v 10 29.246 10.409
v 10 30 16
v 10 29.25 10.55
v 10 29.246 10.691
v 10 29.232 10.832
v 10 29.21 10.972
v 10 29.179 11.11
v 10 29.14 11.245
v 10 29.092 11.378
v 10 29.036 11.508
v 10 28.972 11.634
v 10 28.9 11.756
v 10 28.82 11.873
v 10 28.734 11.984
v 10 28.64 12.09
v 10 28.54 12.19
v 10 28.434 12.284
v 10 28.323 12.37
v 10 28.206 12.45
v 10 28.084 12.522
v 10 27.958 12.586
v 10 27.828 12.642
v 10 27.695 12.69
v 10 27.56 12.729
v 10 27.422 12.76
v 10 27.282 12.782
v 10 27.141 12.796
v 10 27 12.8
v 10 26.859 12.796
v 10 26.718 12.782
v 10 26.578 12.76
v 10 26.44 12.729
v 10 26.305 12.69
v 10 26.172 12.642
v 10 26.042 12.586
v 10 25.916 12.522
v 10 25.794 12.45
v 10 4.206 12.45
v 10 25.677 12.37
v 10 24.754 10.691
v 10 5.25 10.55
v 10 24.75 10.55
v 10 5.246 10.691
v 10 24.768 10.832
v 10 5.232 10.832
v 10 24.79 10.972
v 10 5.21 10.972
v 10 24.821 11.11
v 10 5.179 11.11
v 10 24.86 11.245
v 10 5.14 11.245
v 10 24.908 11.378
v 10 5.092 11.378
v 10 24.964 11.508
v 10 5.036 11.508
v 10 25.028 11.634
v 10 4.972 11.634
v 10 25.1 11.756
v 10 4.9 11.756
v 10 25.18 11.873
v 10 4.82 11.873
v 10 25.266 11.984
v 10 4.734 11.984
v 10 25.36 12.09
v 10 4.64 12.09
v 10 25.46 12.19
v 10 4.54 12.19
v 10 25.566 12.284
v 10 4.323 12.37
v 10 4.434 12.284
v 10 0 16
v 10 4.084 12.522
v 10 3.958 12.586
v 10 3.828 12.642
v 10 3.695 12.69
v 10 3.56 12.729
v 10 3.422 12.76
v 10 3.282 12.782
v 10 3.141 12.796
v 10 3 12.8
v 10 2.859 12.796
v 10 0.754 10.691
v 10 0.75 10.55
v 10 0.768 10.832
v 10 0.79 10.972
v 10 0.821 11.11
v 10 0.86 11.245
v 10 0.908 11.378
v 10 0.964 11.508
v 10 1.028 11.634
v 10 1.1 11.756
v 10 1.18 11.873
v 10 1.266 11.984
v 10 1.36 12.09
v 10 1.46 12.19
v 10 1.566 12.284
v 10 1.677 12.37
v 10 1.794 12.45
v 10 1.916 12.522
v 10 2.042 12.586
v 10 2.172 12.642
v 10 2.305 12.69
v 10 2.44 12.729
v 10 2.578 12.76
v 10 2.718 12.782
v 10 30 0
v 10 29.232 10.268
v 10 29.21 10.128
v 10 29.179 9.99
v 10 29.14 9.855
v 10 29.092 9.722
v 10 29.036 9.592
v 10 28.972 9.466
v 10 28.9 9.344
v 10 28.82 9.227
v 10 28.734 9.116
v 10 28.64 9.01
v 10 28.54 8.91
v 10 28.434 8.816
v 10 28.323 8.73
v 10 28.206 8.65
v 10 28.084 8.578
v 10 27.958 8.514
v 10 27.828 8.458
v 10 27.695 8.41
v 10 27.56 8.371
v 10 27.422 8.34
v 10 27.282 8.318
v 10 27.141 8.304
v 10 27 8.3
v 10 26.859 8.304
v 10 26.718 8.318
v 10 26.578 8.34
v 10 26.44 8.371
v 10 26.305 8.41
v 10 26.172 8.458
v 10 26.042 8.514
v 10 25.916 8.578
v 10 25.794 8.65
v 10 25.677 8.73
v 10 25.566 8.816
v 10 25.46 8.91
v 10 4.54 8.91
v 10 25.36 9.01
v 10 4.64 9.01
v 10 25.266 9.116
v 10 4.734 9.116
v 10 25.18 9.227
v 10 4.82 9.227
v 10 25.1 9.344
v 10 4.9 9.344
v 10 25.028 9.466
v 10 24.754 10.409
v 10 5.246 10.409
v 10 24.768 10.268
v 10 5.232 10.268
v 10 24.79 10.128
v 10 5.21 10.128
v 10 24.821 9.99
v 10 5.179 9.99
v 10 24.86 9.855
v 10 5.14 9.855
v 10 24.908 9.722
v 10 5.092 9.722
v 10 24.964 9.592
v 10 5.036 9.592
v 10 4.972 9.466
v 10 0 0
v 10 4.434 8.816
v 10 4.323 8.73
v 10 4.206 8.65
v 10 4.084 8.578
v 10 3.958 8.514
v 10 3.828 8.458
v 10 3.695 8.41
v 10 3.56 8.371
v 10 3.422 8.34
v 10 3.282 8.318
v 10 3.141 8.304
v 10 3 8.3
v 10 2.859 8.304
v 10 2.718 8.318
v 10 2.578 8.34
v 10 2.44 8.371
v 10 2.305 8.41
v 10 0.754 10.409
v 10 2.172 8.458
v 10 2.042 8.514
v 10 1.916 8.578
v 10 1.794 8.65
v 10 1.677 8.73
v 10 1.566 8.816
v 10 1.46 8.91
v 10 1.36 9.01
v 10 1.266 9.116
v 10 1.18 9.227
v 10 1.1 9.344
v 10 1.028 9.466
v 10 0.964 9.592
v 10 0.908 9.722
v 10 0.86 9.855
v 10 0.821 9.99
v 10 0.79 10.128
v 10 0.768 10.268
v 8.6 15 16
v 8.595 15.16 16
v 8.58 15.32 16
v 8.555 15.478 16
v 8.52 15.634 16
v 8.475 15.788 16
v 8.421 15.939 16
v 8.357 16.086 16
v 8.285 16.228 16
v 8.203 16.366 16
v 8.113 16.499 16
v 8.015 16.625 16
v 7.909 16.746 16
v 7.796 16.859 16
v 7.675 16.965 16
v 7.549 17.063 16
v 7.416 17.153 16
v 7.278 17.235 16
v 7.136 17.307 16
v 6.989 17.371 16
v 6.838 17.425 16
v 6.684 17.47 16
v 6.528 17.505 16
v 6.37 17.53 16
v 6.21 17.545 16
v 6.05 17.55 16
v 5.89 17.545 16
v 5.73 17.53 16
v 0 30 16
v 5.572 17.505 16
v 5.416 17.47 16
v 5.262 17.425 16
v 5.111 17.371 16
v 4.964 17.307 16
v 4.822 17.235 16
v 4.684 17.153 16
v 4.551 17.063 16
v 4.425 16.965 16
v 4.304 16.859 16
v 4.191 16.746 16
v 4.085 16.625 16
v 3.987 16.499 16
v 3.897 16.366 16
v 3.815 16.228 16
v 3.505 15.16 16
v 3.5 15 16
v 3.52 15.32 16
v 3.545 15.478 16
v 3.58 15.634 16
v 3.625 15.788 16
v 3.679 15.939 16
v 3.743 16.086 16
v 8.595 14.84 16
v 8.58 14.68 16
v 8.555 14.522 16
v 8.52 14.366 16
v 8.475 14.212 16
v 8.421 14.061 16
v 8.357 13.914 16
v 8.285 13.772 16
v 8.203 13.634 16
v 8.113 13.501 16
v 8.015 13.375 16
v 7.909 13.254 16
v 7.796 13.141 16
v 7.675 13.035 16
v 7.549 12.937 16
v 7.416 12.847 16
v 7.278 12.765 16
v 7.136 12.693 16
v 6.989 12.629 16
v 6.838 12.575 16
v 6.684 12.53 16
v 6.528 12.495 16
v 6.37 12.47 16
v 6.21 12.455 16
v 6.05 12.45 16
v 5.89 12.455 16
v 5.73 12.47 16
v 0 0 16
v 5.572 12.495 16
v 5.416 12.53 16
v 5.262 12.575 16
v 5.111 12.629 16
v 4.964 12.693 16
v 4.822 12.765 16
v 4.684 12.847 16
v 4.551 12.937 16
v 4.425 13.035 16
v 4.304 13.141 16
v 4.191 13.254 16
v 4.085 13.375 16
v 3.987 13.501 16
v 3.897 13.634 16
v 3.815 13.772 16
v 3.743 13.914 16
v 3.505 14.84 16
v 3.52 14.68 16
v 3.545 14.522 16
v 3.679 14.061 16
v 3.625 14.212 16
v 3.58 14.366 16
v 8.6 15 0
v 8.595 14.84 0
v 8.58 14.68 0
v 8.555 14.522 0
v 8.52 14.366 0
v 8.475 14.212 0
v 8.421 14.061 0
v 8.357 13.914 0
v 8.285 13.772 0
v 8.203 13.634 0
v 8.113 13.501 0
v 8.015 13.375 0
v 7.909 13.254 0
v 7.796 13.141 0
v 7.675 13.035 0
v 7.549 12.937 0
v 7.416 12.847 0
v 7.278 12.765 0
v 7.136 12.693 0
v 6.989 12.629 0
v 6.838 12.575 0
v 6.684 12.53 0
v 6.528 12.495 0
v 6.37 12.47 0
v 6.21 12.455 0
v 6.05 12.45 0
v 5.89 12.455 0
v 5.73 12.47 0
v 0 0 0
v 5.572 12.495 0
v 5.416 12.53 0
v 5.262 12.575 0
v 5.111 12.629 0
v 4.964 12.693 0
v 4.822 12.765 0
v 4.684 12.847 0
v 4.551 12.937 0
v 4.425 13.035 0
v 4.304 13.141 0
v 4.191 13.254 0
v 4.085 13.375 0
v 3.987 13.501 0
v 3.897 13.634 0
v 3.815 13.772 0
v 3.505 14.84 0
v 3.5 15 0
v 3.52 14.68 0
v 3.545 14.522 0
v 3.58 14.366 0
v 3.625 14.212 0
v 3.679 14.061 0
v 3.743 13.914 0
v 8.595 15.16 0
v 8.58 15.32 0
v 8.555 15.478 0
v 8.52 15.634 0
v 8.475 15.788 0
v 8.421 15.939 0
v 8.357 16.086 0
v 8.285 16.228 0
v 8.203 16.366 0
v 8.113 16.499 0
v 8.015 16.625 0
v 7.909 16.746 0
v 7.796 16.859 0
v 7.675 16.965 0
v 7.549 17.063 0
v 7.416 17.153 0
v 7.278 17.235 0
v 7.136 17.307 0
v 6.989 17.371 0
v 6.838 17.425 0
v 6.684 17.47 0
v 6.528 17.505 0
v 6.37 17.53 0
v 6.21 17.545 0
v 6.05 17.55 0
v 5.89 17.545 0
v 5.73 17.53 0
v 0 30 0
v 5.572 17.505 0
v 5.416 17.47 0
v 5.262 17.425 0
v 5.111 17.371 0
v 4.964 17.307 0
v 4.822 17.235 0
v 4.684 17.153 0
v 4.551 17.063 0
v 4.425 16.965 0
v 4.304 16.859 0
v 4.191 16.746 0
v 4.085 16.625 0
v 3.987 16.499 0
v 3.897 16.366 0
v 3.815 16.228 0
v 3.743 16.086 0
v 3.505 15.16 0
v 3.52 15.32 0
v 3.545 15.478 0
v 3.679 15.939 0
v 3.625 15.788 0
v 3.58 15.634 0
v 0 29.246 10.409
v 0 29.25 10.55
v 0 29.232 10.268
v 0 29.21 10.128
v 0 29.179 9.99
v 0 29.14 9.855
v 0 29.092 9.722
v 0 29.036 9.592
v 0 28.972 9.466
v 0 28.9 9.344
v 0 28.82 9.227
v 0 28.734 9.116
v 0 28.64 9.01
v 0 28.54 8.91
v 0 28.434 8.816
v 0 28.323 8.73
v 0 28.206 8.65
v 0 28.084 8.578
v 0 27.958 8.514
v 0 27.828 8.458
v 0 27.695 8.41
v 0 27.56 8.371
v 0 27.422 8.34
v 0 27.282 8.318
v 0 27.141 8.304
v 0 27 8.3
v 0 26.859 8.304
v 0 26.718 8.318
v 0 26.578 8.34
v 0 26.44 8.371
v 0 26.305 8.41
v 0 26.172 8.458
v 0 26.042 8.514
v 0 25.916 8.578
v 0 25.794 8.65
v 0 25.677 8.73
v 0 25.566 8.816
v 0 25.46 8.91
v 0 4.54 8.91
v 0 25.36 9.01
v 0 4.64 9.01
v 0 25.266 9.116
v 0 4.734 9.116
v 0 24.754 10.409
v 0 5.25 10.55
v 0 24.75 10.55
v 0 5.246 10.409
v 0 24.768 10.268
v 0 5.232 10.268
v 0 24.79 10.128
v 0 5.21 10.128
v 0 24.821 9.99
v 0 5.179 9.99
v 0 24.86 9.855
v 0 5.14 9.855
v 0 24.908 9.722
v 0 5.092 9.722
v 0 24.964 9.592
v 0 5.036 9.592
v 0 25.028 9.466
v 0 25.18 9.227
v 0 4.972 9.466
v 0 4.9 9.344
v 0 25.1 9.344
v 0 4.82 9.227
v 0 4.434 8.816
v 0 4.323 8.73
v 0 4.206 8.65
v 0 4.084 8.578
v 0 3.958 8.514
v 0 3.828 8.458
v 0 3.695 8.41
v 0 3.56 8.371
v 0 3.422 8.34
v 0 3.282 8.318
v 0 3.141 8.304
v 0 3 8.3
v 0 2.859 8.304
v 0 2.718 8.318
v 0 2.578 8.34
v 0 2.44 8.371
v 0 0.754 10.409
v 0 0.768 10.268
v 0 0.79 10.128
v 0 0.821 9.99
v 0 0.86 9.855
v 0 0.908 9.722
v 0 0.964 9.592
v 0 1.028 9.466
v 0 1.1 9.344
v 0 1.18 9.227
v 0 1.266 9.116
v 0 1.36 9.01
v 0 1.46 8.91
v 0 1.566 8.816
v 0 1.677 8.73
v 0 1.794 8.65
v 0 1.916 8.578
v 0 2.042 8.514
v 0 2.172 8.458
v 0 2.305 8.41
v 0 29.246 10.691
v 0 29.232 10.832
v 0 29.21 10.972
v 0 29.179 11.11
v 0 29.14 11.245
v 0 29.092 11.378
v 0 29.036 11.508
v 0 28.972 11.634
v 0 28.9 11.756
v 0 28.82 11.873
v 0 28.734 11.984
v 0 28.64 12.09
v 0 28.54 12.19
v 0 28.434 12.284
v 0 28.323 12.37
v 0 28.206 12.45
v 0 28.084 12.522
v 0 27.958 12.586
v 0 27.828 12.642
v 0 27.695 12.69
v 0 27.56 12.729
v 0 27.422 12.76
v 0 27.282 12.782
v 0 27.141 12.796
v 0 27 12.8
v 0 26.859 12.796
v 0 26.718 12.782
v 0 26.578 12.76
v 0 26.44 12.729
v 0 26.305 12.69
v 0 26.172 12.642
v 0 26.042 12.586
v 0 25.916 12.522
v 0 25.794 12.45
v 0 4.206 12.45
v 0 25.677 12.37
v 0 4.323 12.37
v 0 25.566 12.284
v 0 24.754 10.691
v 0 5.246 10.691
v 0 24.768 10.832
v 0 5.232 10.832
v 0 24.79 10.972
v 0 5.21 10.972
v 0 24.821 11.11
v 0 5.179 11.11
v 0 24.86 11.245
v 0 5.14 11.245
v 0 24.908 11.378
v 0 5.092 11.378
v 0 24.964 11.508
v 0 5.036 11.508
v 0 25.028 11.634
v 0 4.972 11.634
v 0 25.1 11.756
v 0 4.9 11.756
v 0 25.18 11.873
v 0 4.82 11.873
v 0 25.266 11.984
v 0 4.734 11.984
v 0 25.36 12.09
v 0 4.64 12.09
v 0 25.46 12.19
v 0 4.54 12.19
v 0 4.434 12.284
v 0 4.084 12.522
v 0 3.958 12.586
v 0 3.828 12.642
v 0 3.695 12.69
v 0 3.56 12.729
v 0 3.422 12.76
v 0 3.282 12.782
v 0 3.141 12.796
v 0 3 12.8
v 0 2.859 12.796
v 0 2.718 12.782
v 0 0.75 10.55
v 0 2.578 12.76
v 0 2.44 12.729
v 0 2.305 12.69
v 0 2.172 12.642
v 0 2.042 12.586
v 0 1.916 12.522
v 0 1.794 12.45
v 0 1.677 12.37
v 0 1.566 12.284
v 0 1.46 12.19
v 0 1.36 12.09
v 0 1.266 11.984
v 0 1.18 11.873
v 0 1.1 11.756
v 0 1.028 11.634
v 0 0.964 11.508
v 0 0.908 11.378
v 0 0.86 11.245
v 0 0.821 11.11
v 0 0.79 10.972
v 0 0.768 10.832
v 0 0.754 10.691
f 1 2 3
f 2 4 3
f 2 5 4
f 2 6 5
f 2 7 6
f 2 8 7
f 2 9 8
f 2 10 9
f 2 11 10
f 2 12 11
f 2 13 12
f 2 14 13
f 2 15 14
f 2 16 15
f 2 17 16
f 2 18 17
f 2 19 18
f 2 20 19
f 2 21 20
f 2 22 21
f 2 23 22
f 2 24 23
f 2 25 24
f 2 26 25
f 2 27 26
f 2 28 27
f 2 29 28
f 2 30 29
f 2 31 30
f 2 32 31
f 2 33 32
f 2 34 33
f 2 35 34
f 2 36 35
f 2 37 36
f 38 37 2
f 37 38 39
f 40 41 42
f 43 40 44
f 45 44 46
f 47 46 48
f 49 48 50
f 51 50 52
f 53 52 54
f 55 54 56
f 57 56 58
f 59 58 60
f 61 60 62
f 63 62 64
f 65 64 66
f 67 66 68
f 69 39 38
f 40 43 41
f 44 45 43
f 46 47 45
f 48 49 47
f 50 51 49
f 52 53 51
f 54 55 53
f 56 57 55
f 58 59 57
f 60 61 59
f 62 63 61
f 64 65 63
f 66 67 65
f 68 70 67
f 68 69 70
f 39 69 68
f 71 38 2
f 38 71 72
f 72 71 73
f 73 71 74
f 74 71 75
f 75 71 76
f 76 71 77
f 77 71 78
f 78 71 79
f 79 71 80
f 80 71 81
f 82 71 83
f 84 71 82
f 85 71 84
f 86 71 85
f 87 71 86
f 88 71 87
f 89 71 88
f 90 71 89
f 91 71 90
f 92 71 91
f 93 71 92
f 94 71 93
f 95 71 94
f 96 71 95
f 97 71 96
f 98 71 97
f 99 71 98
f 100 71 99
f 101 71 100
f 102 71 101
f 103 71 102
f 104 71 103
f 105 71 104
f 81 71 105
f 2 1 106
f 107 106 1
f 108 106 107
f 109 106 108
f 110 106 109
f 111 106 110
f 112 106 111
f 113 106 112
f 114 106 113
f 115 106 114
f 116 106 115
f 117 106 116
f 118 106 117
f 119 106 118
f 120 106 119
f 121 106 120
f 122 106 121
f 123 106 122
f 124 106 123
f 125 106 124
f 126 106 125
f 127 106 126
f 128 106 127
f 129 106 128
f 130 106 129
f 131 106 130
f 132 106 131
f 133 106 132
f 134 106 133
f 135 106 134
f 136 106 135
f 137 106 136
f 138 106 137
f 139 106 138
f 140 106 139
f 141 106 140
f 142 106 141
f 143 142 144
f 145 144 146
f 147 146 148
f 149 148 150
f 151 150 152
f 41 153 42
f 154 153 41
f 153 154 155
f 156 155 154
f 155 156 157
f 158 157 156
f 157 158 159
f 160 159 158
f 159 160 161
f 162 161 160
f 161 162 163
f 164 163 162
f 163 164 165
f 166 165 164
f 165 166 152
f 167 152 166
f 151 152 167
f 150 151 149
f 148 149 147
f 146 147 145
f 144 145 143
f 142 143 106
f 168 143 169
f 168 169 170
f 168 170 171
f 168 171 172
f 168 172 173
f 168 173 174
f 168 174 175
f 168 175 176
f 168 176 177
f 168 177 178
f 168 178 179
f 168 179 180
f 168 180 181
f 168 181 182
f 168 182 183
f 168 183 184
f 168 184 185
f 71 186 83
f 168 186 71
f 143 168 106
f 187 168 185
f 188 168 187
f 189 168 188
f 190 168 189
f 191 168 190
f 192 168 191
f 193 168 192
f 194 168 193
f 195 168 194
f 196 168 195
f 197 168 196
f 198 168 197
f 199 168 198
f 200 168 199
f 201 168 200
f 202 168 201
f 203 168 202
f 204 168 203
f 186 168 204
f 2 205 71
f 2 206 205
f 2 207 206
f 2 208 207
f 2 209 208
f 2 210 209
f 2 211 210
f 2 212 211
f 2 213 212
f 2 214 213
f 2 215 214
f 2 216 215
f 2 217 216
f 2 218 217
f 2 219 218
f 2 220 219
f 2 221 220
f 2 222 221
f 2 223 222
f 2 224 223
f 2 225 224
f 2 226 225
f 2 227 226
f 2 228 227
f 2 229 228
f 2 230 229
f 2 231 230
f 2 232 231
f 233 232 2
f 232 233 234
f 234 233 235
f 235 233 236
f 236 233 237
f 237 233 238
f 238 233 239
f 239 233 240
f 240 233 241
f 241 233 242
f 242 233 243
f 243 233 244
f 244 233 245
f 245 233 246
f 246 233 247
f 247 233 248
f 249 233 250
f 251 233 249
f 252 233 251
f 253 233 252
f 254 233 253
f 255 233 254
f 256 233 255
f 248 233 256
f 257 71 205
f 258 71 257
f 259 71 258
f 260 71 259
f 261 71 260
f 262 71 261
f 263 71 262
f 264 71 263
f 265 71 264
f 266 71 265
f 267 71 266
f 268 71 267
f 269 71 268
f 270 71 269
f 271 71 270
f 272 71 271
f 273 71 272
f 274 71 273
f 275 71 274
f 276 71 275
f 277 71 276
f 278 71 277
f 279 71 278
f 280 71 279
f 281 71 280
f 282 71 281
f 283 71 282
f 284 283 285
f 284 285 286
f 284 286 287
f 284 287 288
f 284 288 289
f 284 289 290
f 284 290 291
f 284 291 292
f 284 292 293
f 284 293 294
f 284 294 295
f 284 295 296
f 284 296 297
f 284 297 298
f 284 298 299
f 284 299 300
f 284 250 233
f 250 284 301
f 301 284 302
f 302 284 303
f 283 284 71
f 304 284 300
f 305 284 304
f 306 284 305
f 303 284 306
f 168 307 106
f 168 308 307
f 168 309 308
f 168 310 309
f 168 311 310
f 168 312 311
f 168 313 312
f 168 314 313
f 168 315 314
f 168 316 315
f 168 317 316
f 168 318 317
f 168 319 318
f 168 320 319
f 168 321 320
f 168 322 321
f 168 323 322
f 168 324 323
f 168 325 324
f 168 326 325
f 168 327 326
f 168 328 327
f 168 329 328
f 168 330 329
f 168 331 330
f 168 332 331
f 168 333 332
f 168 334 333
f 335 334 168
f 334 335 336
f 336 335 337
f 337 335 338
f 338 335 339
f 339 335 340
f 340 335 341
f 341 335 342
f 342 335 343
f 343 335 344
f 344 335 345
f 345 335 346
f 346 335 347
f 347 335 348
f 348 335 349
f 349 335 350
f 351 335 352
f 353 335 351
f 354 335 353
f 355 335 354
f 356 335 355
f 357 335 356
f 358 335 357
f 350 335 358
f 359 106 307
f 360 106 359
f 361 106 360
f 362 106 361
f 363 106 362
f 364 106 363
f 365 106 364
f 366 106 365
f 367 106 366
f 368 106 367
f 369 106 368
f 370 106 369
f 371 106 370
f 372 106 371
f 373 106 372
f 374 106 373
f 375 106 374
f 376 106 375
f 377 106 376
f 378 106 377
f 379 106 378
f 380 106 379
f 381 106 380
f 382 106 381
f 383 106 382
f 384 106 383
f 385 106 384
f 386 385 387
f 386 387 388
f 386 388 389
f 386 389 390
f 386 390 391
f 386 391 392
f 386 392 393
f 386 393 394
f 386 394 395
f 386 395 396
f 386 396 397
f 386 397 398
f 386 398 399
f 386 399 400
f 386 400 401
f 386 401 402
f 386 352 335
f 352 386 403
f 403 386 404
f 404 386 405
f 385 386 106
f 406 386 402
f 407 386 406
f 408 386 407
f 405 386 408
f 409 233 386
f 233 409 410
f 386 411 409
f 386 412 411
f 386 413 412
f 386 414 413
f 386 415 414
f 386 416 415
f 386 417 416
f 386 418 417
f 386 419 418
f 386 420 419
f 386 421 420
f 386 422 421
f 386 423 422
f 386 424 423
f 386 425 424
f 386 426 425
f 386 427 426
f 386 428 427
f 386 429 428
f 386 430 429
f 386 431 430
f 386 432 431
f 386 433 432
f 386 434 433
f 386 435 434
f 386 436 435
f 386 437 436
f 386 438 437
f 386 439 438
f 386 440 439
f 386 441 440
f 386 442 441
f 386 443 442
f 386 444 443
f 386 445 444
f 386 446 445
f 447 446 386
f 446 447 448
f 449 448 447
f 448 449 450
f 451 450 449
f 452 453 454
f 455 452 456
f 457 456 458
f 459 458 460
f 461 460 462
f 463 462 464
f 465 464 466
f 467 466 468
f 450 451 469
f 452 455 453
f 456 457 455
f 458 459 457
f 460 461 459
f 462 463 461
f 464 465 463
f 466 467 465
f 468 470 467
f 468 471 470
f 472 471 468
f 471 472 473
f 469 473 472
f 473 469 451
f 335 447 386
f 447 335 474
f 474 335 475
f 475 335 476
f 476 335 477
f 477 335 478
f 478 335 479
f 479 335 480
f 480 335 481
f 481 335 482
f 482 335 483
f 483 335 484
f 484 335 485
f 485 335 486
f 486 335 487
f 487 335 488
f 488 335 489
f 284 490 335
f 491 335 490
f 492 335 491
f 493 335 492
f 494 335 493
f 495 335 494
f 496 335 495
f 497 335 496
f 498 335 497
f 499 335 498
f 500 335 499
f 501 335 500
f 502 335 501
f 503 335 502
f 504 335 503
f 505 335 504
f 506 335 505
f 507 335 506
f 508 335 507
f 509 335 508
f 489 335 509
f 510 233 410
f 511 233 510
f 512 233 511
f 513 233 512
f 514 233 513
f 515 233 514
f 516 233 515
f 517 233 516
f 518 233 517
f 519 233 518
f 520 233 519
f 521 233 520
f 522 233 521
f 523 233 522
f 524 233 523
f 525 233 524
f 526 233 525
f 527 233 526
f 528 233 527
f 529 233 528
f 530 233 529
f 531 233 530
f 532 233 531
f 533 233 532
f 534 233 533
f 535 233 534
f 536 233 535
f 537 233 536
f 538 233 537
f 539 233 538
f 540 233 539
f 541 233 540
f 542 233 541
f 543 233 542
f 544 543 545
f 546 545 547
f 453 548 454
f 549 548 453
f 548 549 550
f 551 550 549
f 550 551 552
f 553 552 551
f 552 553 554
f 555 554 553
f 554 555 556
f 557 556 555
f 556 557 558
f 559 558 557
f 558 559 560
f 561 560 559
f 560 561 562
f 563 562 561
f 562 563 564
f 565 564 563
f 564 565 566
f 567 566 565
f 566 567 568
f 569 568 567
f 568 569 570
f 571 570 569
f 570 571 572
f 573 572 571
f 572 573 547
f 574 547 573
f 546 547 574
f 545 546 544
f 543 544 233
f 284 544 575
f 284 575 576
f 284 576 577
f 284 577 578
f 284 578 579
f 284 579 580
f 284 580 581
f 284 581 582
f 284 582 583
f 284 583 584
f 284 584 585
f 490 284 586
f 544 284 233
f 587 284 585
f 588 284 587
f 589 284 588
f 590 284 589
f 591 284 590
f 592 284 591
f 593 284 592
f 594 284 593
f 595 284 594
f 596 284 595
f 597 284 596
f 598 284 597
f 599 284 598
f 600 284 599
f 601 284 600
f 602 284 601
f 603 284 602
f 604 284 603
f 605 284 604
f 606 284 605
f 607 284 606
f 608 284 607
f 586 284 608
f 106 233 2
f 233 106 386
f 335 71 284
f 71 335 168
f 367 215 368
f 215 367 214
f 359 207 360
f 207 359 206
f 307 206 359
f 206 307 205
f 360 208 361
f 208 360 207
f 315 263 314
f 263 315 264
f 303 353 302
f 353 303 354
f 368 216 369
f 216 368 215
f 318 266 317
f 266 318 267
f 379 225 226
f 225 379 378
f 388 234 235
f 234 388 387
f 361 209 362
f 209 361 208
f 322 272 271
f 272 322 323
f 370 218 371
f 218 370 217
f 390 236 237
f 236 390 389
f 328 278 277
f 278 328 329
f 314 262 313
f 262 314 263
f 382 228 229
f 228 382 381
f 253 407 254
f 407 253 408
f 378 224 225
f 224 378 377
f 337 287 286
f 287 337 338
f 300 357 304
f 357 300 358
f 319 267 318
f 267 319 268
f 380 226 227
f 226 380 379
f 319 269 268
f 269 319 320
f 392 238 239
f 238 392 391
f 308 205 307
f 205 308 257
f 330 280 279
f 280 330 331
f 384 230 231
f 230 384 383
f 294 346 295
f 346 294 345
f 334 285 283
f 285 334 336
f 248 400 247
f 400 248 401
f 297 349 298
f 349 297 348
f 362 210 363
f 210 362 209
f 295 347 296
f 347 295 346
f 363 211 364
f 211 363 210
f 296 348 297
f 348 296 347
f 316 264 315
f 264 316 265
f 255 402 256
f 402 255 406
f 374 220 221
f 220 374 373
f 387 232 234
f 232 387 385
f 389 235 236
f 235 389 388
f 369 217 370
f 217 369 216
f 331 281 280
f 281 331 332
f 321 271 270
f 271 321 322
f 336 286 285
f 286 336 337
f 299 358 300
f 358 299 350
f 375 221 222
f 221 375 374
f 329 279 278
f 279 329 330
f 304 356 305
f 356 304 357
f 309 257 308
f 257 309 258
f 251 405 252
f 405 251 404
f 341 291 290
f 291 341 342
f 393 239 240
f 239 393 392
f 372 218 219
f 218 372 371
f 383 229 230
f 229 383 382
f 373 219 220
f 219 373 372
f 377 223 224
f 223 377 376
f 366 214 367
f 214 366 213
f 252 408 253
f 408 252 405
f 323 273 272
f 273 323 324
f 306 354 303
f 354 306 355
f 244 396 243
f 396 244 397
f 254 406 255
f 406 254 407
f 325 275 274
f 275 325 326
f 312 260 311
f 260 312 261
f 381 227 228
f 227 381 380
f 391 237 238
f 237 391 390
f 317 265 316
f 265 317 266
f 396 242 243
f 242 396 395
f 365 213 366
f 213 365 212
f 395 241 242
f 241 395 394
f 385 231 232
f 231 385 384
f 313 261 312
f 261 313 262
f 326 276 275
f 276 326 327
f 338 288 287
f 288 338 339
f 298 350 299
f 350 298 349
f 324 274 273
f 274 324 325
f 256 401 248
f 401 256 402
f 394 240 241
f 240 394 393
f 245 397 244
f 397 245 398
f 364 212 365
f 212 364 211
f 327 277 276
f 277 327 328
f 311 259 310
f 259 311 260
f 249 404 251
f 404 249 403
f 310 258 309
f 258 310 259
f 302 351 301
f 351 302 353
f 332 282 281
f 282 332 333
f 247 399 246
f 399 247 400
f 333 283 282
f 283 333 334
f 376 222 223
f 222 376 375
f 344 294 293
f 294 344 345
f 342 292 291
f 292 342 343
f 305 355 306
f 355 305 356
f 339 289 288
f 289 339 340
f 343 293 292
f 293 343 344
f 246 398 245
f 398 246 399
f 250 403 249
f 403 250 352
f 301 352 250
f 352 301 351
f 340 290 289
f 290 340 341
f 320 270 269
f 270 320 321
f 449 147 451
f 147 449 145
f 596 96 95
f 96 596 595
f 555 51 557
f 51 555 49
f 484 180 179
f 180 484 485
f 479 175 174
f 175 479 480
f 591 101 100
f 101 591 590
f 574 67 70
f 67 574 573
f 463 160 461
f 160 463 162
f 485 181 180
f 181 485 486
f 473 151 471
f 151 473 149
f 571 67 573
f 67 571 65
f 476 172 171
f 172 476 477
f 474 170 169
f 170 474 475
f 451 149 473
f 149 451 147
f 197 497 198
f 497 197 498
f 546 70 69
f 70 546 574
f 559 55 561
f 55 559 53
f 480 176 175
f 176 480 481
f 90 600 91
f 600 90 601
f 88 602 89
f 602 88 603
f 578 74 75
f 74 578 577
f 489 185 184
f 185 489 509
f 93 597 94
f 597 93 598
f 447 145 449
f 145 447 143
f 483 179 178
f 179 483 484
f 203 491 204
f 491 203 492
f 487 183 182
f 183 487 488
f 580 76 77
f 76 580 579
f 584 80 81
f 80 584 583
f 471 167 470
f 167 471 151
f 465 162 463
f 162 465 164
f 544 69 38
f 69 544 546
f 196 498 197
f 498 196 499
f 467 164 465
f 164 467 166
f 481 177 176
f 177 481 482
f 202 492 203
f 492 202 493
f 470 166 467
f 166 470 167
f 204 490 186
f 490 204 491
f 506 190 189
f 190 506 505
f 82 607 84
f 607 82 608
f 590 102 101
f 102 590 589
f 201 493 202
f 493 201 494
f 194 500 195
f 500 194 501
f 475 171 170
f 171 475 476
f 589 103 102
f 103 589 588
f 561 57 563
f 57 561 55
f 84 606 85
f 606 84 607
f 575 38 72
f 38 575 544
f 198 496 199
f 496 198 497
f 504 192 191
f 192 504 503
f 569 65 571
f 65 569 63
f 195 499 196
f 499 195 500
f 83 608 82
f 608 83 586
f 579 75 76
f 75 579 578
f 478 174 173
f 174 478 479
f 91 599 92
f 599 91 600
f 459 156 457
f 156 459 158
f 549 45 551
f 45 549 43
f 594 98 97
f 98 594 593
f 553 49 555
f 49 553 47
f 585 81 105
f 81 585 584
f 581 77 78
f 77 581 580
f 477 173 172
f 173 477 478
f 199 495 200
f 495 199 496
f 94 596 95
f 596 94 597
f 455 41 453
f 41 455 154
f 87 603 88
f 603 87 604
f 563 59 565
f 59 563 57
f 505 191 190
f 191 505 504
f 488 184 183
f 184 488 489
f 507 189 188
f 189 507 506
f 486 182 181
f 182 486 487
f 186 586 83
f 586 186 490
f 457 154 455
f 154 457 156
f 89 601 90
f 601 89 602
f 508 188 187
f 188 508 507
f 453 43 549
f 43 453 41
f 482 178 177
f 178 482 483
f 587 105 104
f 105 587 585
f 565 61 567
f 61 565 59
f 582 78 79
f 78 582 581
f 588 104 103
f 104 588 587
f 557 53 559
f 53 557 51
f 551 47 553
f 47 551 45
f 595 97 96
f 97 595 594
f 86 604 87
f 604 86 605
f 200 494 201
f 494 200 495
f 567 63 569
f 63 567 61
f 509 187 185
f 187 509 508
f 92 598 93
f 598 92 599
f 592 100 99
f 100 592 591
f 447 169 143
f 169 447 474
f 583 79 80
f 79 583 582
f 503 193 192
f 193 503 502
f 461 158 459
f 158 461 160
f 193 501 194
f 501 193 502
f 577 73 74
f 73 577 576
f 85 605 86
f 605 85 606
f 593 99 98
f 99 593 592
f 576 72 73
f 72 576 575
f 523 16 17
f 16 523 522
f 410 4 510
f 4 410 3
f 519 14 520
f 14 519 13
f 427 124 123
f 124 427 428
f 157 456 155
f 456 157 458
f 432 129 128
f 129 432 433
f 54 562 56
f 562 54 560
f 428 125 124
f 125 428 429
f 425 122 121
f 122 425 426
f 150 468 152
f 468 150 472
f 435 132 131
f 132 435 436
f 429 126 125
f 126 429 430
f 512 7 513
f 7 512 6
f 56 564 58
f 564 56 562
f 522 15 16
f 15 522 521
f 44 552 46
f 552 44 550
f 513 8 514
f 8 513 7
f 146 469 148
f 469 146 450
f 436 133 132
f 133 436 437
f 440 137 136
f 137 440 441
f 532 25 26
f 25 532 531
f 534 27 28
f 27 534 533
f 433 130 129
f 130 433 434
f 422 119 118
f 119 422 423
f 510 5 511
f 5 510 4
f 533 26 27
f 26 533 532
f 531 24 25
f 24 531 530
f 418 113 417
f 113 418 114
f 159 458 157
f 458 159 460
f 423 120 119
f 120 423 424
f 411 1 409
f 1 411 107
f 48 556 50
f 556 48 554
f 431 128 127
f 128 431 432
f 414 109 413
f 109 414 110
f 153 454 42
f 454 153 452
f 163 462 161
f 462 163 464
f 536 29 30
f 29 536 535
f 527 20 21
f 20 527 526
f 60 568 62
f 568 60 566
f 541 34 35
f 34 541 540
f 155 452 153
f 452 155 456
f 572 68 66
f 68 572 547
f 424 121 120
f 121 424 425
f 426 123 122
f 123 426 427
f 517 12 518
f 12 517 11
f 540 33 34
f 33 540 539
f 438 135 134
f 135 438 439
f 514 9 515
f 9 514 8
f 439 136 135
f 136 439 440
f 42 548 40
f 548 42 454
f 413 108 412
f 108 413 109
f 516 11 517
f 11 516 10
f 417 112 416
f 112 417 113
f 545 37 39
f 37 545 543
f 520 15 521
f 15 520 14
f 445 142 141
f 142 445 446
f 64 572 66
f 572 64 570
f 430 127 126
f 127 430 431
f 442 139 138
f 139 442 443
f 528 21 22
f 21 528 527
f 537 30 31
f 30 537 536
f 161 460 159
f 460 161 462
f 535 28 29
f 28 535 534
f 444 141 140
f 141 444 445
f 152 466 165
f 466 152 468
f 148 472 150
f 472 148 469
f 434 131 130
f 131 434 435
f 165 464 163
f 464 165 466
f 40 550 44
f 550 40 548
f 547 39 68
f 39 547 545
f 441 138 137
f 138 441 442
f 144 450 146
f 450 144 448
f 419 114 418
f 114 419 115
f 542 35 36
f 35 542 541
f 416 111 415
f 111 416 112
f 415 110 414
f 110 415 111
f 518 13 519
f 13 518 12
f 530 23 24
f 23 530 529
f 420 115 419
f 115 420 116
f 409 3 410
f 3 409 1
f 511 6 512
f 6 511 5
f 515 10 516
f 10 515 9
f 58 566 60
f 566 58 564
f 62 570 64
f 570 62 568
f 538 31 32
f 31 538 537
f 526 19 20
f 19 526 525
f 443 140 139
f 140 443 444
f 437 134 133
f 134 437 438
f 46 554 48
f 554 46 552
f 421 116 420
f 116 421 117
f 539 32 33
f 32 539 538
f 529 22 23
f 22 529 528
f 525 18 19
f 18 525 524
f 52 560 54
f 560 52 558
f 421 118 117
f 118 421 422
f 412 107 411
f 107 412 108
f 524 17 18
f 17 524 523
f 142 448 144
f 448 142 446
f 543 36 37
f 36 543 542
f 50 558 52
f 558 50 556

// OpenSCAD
 
height = 16;

block_width = 30;
thickness = 10;

screw_hole_diameter = 4.5;
screw_hole_distance_fromside = 3;
screw_hole_distance_from_bottom = 8.3;

main_hole_diameter = 5.1;
main_hole_distance_from_bottom = 3.5; //guessed



difference() {
    
    //main cube - main hole
    difference(){
        cube([thickness, block_width, height]);
        
        translate([main_hole_distance_from_bottom + main_hole_diameter/2, block_width/2]){
            cylinder(d=main_hole_diameter,h=height, $fn=100);
        }
        //screw holes
        translate([0, screw_hole_distance_fromside, screw_hole_distance_from_bottom + screw_hole_diameter/2])
        rotate(a = [0,90,0])
        cylinder(h=thickness, d=screw_hole_diameter, $fn=100);
        
        translate([0, block_width-screw_hole_distance_fromside, screw_hole_distance_from_bottom + screw_hole_diameter/2])
        rotate(a = [0,90,0])
        cylinder(h=thickness, d=screw_hole_diameter, $fn=100);
    
    }
    
    //todo pöp's
}   
 
